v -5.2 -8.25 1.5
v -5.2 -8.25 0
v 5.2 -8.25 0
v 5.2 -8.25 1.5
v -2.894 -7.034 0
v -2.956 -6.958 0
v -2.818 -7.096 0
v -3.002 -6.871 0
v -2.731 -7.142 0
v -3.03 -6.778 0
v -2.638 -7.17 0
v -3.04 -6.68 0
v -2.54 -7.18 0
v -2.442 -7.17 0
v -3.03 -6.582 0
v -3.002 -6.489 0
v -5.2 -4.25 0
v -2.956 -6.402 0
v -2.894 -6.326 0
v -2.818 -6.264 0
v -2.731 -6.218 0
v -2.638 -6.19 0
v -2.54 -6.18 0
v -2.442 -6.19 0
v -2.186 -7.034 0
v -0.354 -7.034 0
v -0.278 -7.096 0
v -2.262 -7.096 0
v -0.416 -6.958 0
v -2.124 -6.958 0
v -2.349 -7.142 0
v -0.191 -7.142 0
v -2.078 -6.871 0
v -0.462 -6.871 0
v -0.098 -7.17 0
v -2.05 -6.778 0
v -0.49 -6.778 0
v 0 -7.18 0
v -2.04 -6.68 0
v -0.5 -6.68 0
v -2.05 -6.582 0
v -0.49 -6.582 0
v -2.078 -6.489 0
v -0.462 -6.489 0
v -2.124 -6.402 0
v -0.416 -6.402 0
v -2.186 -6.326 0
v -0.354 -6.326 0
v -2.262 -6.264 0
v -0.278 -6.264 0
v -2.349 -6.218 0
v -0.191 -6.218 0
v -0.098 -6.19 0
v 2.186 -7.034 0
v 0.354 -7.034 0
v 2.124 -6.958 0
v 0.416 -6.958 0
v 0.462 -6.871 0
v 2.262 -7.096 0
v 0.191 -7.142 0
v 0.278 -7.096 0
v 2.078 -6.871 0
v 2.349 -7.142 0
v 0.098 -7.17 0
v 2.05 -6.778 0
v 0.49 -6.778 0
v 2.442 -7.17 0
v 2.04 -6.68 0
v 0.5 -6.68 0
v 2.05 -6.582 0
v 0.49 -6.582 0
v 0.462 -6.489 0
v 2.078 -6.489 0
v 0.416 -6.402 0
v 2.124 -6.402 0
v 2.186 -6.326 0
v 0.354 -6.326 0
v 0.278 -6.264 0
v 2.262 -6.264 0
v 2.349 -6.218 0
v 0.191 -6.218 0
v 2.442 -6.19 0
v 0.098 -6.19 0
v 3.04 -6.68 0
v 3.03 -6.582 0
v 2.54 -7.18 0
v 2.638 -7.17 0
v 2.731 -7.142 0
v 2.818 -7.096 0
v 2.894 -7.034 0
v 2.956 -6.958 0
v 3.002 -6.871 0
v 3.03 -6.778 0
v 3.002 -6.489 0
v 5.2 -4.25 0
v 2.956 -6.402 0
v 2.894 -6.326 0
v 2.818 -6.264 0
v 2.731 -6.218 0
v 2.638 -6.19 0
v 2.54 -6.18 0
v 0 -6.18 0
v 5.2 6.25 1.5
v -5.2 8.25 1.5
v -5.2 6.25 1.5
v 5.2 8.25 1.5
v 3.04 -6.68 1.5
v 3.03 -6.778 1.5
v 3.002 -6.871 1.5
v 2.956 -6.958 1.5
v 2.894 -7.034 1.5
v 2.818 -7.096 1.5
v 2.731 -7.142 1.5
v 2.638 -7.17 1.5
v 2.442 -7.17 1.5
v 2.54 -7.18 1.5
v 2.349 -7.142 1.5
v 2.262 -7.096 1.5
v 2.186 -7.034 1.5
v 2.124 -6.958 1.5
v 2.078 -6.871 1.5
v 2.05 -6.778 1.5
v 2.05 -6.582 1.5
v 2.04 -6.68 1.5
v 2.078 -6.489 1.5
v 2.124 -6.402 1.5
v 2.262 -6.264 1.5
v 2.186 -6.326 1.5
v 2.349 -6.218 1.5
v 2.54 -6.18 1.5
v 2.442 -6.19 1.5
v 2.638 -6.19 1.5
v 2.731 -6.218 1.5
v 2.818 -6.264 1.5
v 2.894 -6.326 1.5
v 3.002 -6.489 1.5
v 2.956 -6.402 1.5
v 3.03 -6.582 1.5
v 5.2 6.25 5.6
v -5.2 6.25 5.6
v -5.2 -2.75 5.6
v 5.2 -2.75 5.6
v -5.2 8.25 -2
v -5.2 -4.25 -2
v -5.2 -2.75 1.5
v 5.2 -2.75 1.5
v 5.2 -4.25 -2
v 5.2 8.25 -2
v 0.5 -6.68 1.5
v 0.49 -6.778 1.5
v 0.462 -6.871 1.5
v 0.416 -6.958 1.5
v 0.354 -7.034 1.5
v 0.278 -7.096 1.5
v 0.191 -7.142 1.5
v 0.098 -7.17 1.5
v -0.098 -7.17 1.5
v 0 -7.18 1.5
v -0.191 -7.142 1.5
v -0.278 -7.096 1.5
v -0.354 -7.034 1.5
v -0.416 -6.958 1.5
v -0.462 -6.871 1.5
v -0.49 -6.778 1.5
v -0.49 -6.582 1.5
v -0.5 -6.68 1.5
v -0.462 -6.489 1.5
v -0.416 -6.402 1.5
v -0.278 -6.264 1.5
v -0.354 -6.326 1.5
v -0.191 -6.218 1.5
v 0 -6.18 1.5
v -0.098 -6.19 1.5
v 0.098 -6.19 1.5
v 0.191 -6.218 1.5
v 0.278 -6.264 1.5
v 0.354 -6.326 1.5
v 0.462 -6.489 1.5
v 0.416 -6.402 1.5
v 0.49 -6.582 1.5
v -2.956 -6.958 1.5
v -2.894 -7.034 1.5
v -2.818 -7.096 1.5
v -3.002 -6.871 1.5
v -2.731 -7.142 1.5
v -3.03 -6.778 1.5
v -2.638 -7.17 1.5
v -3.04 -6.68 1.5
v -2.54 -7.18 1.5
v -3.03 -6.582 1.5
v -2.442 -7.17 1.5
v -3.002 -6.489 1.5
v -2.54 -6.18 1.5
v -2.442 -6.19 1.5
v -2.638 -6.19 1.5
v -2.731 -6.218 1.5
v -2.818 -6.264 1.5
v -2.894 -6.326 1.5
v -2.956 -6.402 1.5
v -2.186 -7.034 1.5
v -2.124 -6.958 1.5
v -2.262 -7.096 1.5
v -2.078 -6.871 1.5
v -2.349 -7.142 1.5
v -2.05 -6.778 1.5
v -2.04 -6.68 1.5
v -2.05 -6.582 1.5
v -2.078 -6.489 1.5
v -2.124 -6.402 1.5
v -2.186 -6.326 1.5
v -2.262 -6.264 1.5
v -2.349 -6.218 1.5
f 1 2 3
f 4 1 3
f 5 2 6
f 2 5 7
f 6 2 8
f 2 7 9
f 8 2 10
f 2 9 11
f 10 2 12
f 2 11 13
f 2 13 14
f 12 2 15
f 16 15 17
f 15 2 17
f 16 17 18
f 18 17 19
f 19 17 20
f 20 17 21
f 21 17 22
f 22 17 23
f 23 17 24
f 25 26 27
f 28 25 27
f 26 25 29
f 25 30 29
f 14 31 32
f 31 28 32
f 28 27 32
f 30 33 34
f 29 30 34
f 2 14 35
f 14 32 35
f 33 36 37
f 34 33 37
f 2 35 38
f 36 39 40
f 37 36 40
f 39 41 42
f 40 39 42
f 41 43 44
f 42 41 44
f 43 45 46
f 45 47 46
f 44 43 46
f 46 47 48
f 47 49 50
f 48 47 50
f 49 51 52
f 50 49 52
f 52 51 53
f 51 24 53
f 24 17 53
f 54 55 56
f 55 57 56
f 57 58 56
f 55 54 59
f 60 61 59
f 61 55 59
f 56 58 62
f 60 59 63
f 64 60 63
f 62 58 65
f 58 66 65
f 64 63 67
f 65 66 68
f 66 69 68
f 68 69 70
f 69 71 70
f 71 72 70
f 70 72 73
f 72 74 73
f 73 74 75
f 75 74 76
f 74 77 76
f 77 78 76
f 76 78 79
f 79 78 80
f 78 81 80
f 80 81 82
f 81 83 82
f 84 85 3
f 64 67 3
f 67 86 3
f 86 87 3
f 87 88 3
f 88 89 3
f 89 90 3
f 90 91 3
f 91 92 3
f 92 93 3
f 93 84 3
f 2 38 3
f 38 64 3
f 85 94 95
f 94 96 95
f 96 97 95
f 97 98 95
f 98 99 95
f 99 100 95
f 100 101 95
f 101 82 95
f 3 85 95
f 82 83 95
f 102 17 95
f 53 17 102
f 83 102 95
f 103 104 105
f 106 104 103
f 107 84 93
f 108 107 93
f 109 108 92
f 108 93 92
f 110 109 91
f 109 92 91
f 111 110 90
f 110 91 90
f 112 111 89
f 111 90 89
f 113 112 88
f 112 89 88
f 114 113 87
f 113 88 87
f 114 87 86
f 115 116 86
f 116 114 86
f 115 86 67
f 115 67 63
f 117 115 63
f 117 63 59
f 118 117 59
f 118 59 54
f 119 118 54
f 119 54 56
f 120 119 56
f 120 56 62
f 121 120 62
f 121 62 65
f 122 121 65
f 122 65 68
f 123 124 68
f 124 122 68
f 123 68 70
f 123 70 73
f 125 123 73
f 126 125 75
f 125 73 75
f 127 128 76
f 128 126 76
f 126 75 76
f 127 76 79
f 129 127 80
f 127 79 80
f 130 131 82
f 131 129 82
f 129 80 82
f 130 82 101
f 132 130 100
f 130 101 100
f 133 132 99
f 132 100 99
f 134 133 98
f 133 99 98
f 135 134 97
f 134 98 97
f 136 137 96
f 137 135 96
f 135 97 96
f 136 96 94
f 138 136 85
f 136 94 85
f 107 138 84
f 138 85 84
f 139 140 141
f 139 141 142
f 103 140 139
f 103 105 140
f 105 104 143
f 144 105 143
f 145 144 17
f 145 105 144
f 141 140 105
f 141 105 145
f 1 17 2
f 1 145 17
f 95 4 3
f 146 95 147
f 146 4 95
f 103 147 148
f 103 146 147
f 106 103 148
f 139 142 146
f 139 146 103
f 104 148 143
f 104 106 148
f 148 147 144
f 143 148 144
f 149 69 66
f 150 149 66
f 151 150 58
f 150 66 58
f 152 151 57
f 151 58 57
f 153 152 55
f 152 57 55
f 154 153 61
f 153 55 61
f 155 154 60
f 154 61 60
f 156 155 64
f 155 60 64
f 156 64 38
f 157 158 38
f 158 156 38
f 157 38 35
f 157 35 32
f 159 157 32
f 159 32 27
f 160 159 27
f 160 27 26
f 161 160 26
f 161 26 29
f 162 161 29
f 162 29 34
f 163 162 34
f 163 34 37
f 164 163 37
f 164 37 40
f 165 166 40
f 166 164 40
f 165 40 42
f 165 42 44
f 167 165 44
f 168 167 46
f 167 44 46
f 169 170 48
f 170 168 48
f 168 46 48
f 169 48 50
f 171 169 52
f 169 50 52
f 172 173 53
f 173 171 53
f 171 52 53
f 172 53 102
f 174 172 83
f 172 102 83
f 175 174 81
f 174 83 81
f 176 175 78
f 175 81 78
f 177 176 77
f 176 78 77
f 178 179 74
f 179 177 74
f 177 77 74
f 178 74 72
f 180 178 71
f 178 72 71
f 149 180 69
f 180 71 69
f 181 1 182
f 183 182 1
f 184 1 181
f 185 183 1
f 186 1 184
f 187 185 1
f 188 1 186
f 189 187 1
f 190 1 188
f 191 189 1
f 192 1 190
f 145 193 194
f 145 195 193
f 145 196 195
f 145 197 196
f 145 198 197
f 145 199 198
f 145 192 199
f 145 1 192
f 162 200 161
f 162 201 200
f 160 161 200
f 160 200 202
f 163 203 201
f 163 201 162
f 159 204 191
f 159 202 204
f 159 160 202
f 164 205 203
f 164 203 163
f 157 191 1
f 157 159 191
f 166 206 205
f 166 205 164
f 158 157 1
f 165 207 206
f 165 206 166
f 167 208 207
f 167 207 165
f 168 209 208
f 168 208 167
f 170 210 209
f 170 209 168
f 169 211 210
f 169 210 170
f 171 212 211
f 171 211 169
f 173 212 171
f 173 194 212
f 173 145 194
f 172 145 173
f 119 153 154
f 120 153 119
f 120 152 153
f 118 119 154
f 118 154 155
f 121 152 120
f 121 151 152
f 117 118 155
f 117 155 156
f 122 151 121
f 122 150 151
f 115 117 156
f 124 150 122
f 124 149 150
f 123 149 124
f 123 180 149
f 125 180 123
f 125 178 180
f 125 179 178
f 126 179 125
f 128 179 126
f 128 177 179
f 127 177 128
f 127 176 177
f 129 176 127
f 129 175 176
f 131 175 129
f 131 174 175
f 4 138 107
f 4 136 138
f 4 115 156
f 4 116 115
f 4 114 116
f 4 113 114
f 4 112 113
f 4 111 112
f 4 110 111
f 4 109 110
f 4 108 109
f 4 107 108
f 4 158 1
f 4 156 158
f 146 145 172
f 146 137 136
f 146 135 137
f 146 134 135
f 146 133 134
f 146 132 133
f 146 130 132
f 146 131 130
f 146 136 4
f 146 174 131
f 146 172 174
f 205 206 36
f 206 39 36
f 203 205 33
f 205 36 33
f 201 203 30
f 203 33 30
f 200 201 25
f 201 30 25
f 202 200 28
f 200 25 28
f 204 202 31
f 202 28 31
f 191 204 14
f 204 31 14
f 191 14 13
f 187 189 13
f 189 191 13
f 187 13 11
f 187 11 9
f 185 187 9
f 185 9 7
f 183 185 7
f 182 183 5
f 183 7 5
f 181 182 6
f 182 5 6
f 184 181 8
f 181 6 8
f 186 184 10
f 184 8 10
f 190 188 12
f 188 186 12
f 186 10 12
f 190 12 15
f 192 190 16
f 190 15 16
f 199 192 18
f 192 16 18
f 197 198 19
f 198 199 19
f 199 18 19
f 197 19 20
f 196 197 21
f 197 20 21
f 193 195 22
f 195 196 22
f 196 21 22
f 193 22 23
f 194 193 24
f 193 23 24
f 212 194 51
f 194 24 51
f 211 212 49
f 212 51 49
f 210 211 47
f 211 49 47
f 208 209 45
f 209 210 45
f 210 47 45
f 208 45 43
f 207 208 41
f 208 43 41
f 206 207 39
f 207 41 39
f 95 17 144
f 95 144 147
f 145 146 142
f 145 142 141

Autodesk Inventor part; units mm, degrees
ref_plane "YZ Plane" through (0, 0, 0) normal (1, 0, 0) x (0, 1, 0)
ref_plane "XZ Plane" through (0, 0, 0) normal (0, 1, 0) x (-1, 0, 0)
ref_plane "XY Plane" through (0, 0, 0) normal (0, 0, 1) x (1, 0, 0)
sketch "スケッチ1" plane through (0, 0, 0) normal (0, 0, 1) x (1, 0, 0)
  line L0 (-5.2, -8.25) -> (5.2, -8.25)
  line L1 (5.2, -8.25) -> (5.2, 8.25)
  line L2 (5.2, 8.25) -> (-5.2, 8.25)
  line L3 (-5.2, 8.25) -> (-5.2, -8.25)
  line L4 (-5.2, -8.25) -> (5.2, 8.25) construction
  line L5 (5.2, -8.25) -> (-5.2, 8.25) construction
  circle A0 centre (0, -6.68) radius 0.5
  circle A1 centre (2.54, -6.68) radius 0.5
  circle A2 centre (-2.54, -6.68) radius 0.5
  point P0 (0, 0)
  point P1 (0, 0)
  dimension "d0" = 10.4
  dimension "d1" = 16.5
  dimension "d2" = 1
  dimension "d3" = 2.54
  dimension "d4" = 2.54
  dimension "d5" = 1.57
extrude "押し出し1" add sketch "スケッチ1" along normal blind 1.5
sketch "スケッチ2" plane through (0, 0, 1.5) normal (0, 0, 1) x (1, 0, 0)
  line L0 (-5.2, 8.25) -> (-5.2, -8.25) projected
  line L1 (5.2, -8.25) -> (5.2, 8.25) projected
  line L2 (-5.2, 6.25) -> (5.2, 6.25)
  line L3 (5.2, 6.25) -> (5.2, -2.75)
  line L4 (5.2, -2.75) -> (-5.2, -2.75)
  line L5 (-5.2, -2.75) -> (-5.2, 6.25)
  line L6 (5.2, 8.25) -> (-5.2, 8.25) projected
  point P0 (0, 0)
  dimension "d8" = 2
  dimension "d9" = 9
extrude "押し出し2" add sketch "スケッチ2" along normal blind 4.1 contours L2 L1 L4 L0
sketch "スケッチ3" plane through (0, 0, 0) normal (0, 0, -1) x (-1, 0, 0)
  line L0 (-5.2, 8.25) -> (5.2, 8.25) projected
  line L1 (5.2, 8.25) -> (5.2, -8.25) projected
  line L2 (-5.2, 8.25) -> (5.2, 8.25)
  line L3 (5.2, 8.25) -> (5.2, -4.25)
  line L4 (5.2, -4.25) -> (-5.2, -4.25)
  line L5 (-5.2, -4.25) -> (-5.2, 8.25)
  line L6 (5.2, -8.25) -> (-5.2, -8.25) projected
  point P0 (0, 0)
  dimension "d12" = 4
extrude "押し出し3" add sketch "スケッチ3" along normal blind 2
properties part number "OKI-78SR"
